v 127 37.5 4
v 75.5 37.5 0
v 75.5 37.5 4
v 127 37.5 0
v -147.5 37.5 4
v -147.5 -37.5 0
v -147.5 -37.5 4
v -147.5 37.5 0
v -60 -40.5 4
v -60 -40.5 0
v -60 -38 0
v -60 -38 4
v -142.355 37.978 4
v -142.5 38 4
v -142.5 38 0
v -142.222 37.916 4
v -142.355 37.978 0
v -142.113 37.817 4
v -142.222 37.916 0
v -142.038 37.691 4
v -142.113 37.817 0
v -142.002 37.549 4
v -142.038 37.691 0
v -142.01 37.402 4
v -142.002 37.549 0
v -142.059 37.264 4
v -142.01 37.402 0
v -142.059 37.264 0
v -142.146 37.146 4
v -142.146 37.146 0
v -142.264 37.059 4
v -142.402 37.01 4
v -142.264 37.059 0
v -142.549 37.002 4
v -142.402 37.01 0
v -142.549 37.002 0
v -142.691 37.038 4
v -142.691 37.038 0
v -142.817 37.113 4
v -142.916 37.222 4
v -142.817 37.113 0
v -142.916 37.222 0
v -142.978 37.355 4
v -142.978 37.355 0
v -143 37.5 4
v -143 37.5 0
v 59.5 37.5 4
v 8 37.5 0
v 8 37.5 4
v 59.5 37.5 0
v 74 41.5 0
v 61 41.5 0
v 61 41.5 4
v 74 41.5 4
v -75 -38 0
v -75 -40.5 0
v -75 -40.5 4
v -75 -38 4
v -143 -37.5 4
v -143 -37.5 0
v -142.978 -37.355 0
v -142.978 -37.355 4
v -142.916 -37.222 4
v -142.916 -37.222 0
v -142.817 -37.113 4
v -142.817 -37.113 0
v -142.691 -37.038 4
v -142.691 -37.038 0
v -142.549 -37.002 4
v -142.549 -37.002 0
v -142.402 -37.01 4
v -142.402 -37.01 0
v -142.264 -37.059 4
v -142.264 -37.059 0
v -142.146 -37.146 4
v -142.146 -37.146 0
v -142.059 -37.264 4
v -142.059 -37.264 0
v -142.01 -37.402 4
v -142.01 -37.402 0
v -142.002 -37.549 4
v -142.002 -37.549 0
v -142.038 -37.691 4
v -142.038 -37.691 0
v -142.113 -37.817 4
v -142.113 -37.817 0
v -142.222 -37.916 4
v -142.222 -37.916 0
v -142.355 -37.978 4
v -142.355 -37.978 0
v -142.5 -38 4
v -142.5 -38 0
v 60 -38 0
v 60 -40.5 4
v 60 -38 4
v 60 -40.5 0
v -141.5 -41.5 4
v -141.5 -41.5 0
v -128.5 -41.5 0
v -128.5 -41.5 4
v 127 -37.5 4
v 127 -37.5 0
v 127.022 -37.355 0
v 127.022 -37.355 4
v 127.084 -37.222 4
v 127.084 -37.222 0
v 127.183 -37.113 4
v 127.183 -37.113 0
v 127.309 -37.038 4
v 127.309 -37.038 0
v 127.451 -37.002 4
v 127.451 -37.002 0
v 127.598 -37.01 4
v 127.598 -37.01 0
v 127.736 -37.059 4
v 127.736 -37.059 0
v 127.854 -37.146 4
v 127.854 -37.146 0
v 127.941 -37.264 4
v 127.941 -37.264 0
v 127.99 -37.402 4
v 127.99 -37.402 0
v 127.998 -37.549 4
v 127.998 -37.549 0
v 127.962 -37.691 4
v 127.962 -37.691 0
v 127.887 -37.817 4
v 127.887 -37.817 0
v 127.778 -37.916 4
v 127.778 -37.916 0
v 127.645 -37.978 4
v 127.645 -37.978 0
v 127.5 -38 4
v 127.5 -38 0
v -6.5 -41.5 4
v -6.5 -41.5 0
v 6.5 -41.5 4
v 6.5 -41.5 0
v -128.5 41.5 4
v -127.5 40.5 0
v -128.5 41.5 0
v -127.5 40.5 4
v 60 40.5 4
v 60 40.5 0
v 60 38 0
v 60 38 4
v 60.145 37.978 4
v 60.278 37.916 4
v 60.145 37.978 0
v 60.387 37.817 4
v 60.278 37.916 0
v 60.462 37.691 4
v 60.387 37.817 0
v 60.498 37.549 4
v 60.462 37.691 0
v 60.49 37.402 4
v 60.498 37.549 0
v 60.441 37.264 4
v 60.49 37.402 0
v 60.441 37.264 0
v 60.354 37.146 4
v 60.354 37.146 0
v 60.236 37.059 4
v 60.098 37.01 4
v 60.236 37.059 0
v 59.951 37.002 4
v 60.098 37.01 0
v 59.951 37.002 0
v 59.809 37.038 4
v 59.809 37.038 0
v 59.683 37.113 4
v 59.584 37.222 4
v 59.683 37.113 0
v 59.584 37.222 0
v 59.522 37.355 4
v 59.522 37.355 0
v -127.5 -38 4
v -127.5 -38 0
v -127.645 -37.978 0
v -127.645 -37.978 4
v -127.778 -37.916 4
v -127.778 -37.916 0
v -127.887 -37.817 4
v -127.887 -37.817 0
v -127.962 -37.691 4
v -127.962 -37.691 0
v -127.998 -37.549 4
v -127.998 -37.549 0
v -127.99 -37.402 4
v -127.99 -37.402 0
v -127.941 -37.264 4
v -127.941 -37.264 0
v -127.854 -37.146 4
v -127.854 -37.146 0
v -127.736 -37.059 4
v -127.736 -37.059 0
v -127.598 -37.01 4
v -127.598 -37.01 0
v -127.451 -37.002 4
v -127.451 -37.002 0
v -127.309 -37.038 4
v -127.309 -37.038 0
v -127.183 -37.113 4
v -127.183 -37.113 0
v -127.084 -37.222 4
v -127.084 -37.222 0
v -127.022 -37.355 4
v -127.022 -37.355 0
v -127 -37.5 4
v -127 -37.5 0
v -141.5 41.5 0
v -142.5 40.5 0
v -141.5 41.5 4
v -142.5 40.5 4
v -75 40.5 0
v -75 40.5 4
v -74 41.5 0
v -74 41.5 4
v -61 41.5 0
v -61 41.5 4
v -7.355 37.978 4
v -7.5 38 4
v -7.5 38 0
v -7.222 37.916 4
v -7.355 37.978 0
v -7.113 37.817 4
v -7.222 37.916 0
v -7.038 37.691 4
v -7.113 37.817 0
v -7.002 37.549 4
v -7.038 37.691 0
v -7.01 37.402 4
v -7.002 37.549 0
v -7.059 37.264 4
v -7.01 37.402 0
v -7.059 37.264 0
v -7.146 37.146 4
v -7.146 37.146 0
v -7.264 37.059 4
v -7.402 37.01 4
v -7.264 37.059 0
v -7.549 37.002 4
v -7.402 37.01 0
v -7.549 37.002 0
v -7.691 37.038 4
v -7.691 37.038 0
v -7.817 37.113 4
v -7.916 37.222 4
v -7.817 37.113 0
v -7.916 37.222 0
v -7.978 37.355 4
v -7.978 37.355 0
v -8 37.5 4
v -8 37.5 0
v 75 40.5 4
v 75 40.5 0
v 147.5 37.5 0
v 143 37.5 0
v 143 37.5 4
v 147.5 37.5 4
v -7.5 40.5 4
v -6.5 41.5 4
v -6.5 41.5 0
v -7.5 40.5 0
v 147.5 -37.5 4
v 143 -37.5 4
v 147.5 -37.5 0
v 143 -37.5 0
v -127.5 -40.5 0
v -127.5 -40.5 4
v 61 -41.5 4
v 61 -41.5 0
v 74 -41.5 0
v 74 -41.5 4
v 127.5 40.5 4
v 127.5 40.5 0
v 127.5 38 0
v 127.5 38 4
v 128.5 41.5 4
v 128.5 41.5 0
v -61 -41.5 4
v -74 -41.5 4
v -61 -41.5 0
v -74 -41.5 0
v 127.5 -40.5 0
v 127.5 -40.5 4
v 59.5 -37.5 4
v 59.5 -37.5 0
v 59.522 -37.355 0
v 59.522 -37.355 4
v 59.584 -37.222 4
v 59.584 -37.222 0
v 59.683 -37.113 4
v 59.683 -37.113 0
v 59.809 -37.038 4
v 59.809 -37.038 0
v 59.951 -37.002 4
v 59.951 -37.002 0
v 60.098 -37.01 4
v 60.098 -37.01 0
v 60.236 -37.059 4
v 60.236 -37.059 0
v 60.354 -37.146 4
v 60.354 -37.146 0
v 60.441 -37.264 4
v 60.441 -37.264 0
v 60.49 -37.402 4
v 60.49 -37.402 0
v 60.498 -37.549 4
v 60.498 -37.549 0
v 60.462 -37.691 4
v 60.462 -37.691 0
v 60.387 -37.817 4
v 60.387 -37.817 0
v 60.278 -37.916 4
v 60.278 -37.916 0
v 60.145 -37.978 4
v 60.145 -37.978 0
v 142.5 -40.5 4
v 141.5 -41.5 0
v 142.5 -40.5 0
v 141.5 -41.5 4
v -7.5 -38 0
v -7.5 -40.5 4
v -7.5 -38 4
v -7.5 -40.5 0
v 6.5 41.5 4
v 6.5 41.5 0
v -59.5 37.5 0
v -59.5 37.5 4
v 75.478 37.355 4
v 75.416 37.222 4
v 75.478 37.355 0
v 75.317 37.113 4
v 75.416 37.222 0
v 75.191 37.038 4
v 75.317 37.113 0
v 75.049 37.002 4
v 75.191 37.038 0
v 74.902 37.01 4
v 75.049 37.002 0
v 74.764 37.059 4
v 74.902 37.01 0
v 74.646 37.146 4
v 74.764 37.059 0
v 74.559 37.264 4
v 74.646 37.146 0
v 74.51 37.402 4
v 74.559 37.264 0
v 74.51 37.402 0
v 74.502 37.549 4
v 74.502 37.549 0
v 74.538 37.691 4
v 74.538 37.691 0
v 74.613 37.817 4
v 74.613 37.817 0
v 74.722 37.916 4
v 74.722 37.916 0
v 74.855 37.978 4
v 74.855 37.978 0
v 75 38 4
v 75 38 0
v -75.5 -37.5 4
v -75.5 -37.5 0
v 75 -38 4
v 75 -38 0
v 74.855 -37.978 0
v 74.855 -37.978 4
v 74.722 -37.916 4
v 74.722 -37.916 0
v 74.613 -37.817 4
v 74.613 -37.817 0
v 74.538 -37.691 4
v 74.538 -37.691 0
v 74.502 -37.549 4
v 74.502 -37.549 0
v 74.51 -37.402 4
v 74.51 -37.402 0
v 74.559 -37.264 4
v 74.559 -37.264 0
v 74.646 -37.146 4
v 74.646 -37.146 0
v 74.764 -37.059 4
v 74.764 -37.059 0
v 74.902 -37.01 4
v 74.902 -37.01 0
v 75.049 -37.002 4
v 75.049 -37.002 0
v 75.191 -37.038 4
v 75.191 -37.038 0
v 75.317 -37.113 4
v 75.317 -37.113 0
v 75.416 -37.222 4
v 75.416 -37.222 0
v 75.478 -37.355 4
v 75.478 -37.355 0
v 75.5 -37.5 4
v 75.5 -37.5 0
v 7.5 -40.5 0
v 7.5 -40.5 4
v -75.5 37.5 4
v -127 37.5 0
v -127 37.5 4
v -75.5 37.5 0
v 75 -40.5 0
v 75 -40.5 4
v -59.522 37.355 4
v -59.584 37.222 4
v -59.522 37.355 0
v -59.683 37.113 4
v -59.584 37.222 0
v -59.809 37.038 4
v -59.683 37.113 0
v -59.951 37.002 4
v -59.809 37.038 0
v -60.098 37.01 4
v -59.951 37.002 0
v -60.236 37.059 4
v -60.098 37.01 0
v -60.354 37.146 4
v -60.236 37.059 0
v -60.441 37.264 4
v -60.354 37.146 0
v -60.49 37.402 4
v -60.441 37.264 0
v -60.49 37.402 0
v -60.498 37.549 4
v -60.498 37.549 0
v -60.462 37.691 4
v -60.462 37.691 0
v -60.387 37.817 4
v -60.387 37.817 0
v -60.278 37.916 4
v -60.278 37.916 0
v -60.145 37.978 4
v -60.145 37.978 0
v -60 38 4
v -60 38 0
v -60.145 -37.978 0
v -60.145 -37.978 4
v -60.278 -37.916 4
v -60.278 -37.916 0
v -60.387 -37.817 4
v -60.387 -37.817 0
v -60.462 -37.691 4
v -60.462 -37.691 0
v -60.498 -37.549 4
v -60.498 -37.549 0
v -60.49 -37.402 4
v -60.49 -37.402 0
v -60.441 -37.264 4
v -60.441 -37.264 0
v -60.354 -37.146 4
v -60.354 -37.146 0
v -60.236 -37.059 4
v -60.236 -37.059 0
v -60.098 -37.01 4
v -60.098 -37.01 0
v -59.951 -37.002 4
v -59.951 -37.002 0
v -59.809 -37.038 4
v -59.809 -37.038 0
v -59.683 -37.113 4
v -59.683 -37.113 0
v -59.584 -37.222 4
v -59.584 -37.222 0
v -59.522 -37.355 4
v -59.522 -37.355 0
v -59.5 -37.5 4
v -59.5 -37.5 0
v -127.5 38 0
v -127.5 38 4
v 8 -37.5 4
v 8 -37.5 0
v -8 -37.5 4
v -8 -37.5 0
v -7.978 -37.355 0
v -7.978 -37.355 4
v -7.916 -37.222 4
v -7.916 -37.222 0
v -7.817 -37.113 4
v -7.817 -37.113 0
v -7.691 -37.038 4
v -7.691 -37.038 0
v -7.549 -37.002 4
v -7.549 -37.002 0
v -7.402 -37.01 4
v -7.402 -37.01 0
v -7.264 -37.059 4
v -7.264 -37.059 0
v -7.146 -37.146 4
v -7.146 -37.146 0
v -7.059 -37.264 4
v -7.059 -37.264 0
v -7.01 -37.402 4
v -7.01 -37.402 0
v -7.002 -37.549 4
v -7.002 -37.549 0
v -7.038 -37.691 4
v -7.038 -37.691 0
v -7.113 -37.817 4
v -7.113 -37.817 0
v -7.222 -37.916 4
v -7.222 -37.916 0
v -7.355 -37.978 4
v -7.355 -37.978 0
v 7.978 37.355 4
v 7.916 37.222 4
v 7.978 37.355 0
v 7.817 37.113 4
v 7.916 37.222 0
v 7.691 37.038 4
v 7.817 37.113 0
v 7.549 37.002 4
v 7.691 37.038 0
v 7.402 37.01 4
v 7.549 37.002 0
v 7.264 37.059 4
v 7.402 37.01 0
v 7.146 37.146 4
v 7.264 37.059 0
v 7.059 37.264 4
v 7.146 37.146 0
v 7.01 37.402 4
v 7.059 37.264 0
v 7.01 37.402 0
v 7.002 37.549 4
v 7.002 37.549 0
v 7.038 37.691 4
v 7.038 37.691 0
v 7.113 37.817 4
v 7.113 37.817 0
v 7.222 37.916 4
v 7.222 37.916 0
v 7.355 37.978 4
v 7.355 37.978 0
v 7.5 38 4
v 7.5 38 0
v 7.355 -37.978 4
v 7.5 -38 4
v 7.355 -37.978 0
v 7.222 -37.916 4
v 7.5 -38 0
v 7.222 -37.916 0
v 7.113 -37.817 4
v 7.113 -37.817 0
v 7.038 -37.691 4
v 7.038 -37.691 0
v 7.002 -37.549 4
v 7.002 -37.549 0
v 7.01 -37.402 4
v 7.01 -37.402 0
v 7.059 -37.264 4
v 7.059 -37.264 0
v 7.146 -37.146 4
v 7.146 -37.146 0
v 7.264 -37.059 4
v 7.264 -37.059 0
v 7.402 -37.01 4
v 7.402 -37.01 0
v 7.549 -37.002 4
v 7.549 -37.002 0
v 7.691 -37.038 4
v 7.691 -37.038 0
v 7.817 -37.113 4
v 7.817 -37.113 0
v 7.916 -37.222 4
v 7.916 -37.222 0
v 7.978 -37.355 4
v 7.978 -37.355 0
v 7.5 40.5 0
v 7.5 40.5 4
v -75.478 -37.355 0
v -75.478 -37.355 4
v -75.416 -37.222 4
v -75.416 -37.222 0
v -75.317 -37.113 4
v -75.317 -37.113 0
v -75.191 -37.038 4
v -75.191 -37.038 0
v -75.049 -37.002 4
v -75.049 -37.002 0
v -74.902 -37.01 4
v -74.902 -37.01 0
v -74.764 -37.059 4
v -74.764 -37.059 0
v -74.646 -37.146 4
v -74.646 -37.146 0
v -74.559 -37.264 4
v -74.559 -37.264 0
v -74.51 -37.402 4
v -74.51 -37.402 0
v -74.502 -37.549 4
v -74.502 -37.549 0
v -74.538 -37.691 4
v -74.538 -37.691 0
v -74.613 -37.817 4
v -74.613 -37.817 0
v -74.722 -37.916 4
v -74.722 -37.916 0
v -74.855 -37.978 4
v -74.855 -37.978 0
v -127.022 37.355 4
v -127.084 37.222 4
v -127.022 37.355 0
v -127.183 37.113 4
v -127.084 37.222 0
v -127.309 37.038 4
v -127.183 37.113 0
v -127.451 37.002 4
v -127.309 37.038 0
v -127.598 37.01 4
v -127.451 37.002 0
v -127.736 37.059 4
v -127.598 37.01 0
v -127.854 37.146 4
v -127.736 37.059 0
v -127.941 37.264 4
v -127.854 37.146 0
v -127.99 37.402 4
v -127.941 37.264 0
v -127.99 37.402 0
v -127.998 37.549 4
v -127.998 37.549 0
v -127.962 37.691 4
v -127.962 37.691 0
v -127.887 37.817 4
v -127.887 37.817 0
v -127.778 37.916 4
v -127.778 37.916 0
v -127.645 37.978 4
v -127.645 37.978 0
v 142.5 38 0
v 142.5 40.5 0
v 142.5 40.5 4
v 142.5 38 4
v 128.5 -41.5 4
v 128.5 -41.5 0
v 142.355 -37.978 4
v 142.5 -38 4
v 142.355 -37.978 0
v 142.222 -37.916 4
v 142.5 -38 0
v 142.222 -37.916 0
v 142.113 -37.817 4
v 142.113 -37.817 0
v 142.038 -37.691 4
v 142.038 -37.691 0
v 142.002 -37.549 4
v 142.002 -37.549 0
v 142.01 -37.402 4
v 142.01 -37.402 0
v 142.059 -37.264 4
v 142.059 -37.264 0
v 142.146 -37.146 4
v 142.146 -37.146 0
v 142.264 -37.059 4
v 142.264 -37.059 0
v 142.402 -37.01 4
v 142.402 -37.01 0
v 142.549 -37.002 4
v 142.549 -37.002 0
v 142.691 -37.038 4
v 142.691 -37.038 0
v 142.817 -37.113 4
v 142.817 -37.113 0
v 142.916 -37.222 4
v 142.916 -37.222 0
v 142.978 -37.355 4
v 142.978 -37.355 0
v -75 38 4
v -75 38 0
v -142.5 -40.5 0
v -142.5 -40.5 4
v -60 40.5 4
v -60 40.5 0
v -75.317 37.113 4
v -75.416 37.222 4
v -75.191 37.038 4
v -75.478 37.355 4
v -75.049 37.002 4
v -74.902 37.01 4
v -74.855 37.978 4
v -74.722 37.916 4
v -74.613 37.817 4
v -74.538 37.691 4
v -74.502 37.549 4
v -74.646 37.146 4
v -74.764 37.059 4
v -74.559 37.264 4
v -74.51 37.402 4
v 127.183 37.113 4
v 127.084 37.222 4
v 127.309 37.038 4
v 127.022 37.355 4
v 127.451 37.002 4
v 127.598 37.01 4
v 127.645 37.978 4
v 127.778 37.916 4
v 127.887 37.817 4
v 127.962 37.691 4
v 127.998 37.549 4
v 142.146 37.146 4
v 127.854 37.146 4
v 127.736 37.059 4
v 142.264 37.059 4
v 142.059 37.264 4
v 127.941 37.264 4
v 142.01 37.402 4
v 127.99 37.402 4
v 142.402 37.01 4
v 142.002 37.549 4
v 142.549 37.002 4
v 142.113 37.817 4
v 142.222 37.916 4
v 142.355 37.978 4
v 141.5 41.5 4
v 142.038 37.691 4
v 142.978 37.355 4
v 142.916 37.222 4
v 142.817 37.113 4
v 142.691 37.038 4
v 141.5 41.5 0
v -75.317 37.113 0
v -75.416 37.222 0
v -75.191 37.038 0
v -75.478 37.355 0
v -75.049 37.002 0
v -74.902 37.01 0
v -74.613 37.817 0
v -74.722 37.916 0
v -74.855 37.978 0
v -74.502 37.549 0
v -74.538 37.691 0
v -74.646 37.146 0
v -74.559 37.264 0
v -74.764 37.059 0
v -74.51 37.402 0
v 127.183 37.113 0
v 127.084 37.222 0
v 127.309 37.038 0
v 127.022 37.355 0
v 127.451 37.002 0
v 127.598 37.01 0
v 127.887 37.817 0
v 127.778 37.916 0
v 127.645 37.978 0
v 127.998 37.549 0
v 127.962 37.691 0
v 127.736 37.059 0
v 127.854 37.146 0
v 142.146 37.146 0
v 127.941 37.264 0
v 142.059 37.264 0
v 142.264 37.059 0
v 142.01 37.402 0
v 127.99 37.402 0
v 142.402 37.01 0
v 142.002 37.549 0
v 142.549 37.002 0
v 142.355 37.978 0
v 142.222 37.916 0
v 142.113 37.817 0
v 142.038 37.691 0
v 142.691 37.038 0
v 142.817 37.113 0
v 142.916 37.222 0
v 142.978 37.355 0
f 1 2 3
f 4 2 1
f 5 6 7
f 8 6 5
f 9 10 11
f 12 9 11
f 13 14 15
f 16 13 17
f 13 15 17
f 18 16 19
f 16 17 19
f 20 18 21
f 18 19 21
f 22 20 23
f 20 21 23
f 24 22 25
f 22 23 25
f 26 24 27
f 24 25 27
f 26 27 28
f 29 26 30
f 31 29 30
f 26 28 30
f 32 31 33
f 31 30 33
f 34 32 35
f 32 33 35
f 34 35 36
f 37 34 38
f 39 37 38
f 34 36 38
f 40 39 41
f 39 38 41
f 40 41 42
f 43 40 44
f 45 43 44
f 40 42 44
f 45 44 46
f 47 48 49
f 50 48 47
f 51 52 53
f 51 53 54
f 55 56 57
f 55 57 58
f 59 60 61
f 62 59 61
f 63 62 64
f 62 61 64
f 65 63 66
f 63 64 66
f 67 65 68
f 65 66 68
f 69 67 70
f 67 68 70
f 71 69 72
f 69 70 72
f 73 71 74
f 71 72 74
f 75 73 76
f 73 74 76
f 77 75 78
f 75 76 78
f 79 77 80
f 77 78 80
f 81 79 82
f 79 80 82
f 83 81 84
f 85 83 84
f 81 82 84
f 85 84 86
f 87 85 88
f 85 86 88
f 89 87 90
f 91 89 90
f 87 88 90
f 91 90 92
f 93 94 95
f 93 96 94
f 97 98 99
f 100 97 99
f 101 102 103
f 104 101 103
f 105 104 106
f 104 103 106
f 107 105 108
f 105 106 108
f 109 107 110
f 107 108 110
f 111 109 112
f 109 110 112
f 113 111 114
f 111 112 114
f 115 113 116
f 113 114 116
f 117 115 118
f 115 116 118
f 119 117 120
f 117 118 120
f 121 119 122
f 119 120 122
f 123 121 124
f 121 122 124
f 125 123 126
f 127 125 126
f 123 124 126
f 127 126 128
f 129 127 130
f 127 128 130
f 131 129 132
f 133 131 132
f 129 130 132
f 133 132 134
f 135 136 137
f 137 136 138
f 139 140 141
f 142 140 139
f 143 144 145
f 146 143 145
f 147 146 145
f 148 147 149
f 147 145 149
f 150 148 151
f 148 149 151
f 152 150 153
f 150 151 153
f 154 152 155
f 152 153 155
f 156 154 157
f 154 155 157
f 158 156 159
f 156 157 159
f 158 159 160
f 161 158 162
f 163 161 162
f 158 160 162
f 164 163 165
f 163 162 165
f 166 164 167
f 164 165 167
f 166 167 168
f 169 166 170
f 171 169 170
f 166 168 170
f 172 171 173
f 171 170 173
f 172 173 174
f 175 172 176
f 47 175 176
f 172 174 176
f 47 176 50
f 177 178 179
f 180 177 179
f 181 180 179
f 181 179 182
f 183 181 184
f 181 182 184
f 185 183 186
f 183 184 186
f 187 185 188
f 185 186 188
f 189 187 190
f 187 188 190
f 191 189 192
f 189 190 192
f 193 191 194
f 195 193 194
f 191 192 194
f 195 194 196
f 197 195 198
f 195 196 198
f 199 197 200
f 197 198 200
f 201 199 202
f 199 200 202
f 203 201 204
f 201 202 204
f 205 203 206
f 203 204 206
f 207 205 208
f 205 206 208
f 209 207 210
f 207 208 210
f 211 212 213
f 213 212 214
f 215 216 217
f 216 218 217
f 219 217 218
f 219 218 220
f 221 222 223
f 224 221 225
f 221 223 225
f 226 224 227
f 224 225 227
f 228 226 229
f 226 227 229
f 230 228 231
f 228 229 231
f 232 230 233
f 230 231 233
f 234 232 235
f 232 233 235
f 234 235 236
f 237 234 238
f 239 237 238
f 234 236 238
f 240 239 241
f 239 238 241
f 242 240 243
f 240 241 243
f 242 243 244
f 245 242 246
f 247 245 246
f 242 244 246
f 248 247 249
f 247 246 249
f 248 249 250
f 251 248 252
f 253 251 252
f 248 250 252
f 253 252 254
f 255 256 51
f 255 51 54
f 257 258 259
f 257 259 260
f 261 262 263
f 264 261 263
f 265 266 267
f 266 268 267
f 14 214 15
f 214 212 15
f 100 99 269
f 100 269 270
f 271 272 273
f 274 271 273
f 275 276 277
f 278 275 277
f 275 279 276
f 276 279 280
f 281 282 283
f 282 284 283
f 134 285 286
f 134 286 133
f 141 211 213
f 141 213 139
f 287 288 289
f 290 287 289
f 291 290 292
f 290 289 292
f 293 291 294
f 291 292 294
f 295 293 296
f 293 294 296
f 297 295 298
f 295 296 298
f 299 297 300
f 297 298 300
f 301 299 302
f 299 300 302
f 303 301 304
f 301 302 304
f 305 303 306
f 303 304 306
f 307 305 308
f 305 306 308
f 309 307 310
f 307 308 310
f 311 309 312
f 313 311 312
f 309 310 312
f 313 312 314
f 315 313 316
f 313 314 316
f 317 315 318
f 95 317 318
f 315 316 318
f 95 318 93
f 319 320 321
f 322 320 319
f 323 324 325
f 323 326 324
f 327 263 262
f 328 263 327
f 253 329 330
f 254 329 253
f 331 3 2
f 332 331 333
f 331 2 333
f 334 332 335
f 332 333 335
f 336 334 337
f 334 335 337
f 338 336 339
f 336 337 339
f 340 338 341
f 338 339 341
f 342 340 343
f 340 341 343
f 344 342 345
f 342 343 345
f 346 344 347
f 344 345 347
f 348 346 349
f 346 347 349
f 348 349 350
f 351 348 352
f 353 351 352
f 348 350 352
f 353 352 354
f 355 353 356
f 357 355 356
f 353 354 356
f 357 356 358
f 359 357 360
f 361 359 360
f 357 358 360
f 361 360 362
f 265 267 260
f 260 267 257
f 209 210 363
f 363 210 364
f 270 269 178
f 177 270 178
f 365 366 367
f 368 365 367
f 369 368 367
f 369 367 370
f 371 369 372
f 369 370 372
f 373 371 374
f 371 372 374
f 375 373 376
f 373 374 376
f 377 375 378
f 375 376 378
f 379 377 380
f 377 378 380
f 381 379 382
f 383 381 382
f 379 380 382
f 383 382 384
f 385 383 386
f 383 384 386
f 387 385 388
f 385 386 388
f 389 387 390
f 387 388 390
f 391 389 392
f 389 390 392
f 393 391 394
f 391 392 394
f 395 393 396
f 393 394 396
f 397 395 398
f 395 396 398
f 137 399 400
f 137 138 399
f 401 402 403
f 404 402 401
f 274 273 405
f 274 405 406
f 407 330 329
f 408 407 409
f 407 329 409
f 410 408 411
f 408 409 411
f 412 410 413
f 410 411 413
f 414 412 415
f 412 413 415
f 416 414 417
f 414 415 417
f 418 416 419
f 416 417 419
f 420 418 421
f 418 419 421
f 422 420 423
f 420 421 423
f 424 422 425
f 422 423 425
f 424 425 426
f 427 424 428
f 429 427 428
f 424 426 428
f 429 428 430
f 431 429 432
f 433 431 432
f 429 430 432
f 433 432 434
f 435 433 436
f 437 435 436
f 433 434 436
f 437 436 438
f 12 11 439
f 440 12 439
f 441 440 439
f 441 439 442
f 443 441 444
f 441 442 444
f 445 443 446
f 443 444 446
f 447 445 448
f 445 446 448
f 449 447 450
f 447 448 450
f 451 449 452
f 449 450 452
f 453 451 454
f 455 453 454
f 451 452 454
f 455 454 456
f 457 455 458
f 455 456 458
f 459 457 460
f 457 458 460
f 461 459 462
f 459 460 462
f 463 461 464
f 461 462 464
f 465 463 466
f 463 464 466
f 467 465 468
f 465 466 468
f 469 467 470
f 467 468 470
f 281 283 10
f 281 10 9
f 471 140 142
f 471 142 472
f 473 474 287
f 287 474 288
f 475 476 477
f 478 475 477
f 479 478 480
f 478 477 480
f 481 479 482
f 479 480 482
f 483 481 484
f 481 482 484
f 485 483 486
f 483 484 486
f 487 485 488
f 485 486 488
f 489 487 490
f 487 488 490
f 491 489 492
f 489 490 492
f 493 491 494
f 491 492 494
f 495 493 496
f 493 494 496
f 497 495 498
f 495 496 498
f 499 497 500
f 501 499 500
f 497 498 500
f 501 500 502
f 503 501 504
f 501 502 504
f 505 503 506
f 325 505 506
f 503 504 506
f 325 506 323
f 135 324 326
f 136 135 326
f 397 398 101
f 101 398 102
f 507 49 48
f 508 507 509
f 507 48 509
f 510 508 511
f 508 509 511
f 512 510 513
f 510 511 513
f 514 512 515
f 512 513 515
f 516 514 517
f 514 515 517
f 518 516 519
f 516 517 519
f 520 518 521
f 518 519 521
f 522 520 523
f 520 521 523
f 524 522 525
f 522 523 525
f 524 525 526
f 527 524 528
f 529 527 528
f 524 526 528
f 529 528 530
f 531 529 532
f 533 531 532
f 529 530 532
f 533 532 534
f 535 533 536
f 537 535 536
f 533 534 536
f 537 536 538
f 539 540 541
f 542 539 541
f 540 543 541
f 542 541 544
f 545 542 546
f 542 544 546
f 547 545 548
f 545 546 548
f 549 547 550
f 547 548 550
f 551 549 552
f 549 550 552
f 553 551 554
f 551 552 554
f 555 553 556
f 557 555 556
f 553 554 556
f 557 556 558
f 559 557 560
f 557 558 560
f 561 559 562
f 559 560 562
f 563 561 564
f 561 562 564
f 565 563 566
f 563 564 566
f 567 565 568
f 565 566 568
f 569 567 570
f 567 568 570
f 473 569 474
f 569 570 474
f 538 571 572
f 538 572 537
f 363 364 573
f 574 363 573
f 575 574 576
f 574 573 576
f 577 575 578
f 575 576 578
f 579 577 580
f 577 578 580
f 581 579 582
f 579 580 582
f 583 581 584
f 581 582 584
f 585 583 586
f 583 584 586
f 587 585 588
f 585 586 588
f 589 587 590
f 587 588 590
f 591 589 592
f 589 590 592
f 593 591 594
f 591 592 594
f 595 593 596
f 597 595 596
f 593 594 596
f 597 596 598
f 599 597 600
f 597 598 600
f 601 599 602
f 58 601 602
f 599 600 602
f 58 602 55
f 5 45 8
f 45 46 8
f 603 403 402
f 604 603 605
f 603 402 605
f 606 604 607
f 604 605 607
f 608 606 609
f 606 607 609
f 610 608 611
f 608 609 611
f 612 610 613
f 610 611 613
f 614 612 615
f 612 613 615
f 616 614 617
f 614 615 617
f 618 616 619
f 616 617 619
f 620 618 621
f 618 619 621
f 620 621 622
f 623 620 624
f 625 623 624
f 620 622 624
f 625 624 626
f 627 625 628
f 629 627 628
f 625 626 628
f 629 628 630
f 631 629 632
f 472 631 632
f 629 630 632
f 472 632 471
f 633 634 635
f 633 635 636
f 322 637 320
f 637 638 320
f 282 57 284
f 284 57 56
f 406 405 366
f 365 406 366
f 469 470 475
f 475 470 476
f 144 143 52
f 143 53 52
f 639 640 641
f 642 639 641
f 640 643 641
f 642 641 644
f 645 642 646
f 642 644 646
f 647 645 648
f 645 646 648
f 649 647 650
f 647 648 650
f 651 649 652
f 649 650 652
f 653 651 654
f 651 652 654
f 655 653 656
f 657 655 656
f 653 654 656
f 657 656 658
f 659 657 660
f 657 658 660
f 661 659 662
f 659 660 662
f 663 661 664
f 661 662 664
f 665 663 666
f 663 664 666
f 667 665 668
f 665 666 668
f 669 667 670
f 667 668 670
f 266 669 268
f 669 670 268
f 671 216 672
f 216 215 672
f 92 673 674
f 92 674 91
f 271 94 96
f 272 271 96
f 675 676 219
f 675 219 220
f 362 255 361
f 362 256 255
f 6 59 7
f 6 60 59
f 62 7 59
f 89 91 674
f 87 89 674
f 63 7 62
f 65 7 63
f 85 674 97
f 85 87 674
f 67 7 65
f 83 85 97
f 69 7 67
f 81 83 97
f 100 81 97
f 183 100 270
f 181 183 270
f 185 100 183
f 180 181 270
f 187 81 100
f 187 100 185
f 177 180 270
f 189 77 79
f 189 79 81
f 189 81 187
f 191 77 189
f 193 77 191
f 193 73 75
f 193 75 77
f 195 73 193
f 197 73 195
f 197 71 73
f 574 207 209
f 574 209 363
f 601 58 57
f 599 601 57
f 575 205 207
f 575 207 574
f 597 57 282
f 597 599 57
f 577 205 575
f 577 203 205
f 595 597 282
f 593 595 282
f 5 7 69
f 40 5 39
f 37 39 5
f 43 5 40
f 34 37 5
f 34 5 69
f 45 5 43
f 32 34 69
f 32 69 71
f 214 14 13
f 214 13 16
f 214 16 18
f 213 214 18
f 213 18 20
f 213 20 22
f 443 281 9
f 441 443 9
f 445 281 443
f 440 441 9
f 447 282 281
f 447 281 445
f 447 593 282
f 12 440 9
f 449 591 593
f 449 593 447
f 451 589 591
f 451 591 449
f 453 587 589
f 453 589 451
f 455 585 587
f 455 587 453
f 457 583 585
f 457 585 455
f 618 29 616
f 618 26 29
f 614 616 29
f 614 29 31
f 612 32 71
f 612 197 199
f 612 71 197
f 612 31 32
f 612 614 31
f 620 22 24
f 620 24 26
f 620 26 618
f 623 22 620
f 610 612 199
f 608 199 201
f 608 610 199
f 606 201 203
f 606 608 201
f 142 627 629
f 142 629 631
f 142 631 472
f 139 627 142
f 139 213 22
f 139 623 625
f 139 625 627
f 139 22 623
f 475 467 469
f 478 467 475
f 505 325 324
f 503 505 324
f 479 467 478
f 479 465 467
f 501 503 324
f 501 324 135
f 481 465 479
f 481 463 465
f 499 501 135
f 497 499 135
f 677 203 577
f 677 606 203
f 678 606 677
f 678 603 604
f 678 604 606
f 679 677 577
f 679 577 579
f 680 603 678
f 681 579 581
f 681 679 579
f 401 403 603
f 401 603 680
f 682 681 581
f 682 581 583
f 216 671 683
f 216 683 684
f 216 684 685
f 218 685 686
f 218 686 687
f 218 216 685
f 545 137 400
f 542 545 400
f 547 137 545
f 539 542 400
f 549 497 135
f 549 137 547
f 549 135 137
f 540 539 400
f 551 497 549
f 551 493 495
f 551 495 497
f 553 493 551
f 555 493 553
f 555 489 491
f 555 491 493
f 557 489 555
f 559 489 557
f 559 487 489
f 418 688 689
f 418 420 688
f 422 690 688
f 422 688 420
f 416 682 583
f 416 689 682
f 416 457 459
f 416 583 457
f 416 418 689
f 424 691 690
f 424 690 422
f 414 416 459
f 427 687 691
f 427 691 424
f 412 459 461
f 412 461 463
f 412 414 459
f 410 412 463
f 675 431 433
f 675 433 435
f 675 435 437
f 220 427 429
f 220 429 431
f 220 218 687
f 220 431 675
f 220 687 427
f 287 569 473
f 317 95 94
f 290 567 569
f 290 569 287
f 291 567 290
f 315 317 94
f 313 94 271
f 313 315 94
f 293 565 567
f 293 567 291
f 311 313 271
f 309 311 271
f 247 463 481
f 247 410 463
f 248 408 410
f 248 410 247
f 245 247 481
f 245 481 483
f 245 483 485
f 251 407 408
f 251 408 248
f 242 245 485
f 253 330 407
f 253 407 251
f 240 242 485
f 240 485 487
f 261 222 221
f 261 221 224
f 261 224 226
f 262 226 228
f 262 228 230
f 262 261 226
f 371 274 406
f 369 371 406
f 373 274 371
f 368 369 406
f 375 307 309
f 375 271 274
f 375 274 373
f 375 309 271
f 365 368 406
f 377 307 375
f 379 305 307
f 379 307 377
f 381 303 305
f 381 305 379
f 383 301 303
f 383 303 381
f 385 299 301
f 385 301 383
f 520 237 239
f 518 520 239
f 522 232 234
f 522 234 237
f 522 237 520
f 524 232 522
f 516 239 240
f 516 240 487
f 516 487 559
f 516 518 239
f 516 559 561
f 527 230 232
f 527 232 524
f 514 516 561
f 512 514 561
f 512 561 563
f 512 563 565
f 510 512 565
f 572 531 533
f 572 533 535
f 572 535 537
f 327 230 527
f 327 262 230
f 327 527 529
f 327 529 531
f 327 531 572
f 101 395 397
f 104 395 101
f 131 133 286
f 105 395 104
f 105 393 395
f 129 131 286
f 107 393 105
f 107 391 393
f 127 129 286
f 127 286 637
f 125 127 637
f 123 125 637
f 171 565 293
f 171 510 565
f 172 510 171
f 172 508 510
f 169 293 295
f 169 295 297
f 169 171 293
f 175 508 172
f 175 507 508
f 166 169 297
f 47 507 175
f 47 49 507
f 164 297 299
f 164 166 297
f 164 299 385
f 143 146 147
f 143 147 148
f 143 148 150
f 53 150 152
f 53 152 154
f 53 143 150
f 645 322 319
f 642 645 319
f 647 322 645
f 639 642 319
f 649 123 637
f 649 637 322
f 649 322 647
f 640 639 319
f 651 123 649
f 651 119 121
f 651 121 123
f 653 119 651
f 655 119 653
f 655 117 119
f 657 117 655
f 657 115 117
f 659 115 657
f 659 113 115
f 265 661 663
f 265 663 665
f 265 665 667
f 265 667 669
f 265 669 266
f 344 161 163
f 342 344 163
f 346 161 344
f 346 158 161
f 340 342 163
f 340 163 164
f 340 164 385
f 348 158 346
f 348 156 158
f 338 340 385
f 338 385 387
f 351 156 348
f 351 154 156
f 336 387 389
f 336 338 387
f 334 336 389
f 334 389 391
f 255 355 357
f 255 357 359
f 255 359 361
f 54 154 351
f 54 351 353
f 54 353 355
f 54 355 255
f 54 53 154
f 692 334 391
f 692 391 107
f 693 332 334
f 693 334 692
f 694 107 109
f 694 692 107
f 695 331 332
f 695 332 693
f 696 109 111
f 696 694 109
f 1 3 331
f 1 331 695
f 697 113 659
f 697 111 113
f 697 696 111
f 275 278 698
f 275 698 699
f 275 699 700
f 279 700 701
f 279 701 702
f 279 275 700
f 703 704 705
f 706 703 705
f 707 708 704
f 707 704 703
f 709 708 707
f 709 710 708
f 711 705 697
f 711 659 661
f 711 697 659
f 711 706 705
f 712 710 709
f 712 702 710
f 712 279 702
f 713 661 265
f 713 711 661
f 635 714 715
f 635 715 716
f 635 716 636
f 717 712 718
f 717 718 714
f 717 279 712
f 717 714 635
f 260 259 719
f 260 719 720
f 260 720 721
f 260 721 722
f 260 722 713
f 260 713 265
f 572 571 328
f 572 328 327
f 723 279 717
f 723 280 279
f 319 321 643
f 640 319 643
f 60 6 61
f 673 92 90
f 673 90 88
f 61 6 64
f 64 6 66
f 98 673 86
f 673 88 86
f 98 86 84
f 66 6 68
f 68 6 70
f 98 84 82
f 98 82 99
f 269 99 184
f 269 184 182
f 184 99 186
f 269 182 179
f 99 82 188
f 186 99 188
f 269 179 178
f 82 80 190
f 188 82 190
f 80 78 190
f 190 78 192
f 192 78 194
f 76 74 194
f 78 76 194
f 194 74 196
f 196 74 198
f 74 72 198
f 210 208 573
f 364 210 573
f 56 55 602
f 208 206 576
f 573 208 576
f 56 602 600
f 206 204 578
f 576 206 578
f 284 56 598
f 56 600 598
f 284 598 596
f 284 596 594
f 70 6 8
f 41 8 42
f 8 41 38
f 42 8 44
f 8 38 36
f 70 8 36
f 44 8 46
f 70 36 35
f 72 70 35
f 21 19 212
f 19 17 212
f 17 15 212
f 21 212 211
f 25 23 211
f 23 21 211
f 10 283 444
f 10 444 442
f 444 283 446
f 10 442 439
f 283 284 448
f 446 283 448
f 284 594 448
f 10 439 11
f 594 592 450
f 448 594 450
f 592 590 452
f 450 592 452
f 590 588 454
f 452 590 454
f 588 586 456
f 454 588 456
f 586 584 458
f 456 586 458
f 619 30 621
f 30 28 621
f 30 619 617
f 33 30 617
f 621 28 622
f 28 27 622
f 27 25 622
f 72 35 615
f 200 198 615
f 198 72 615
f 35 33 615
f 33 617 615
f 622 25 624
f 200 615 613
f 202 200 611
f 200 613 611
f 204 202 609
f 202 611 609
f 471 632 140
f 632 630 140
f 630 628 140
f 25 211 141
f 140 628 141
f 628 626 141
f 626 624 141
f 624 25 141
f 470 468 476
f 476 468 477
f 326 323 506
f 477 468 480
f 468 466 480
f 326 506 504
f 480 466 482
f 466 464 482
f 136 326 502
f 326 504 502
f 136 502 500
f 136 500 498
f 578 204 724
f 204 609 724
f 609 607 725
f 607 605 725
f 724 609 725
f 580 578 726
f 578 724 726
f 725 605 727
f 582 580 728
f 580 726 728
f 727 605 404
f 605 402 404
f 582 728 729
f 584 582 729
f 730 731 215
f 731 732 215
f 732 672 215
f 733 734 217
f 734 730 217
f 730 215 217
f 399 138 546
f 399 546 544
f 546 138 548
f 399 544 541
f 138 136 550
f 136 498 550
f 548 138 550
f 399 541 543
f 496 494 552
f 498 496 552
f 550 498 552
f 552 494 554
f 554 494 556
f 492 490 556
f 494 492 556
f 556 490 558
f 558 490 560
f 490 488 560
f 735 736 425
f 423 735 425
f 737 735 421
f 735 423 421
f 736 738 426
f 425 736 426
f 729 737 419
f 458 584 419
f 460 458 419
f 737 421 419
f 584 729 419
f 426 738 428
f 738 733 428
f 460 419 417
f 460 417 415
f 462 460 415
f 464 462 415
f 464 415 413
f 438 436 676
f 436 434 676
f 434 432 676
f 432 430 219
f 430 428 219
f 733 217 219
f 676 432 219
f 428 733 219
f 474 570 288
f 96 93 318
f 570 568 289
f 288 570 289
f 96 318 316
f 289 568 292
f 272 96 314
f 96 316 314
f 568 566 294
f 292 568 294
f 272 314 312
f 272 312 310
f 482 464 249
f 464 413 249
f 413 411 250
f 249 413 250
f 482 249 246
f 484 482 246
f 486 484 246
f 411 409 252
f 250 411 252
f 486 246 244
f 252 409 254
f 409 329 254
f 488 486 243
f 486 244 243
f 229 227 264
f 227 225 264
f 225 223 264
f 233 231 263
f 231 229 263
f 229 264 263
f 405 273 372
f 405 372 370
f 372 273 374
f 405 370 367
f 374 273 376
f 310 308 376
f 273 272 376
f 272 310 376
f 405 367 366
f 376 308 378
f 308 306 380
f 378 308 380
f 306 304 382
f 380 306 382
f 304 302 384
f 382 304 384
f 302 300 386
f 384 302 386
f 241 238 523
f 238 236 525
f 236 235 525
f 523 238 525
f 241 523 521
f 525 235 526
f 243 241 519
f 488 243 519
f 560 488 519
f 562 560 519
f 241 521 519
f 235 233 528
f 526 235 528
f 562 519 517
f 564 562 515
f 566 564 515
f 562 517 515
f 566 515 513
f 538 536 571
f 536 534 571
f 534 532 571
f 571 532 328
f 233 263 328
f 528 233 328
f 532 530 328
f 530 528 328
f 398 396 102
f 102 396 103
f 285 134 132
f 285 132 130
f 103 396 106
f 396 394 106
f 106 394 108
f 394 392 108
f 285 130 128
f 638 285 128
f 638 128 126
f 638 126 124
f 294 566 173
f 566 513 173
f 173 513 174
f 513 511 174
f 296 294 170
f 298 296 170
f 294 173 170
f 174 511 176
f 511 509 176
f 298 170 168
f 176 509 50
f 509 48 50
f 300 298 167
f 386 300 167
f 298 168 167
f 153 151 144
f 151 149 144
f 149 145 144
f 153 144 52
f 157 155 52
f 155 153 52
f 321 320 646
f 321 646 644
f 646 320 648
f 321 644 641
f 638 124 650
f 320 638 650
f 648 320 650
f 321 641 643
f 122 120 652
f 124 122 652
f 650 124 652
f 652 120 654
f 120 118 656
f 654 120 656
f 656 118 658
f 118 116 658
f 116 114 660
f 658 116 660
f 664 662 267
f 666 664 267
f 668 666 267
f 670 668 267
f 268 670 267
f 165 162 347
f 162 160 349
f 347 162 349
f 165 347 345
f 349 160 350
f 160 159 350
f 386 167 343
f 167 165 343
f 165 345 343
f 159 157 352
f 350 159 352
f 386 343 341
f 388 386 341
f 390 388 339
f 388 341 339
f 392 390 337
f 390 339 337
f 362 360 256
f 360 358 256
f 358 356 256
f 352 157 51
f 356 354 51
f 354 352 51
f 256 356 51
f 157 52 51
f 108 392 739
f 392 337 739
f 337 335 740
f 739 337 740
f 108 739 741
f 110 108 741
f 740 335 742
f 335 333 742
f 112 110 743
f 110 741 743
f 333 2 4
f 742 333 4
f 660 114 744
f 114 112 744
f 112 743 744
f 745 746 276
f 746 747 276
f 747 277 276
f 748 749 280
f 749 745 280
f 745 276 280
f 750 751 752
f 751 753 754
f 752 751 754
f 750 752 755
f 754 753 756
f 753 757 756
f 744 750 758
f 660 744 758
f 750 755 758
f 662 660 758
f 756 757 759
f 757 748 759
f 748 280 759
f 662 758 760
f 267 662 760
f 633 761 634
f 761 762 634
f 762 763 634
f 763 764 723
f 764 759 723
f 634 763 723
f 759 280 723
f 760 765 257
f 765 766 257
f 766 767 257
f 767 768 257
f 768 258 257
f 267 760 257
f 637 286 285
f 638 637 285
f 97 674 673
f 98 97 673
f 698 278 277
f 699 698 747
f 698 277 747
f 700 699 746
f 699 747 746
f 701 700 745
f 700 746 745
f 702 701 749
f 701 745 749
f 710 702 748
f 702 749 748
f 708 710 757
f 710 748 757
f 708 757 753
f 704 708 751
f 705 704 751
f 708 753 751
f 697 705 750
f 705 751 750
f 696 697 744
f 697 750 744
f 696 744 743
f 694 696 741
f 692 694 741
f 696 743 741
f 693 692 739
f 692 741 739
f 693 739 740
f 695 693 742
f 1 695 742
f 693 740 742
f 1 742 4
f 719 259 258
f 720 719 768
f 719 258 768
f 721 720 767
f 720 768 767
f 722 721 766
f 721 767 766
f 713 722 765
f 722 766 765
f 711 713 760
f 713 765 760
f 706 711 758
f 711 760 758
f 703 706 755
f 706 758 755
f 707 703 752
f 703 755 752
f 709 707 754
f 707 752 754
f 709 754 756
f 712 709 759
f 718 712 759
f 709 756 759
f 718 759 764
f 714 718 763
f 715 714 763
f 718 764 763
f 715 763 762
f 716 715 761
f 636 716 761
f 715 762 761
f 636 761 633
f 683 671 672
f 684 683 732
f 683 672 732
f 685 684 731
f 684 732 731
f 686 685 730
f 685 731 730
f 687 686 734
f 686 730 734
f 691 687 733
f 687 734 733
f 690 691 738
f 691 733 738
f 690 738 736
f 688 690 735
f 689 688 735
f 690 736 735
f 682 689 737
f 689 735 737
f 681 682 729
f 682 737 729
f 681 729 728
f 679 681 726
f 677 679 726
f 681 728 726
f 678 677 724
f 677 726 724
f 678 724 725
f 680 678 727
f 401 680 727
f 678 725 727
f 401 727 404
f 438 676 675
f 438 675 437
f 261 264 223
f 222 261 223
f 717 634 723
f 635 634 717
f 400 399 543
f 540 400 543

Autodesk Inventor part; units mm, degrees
ref_plane "Plan YZ" through (0, 0, 0) normal (1, 0, 0) x (0, 1, 0)
ref_plane "Plan XZ" through (0, 0, 0) normal (0, 1, 0) x (-1, 0, 0)
ref_plane "Plan XY" through (0, 0, 0) normal (0, 0, 1) x (1, 0, 0)
sketch "Esquisse1" plane through (0, 0, 0) normal (0, 0, 1) x (1, 0, 0)
  line L0 (-142.5, 41.5) -> (-142.5, 37.5)
  line L1 (-142.5, 41.5) -> (-127.5, 41.5)
  line L2 (-127.5, 41.5) -> (-127.5, 37.5)
  line L3 (0, -58.1) -> (0, 58.1) construction
  line L4 (-206.5, 0) -> (206.5, 0) construction
  line L5 (-75, 41.5) -> (-75, 37.5)
  line L6 (-75, 41.5) -> (-60, 41.5)
  line L7 (-60, 41.5) -> (-60, 37.5)
  line L8 (-7.5, 41.5) -> (-7.5, 37.5)
  line L9 (-7.5, 41.5) -> (7.5, 41.5)
  line L10 (7.5, 41.5) -> (7.5, 37.5)
  line L11 (60, 41.5) -> (60, 37.5)
  line L12 (60, 41.5) -> (75, 41.5)
  line L13 (75, 41.5) -> (75, 37.5)
  line L14 (127.5, 41.5) -> (127.5, 37.5)
  line L15 (127.5, 41.5) -> (142.5, 41.5)
  line L16 (142.5, 41.5) -> (142.5, 37.5)
  line L17 (-127.5, 37.5) -> (-75, 37.5)
  line L18 (-60, 37.5) -> (-7.5, 37.5)
  line L19 (7.5, 37.5) -> (60, 37.5)
  line L20 (75, 37.5) -> (127.5, 37.5)
  line L21 (142.5, 37.5) -> (147.5, 37.5)
  line L22 (-142.5, 37.5) -> (-147.5, 37.5)
  line L23 (-142.5, -41.5) -> (-142.5, -37.5)
  line L24 (-142.5, -41.5) -> (-127.5, -41.5)
  line L25 (-127.5, -41.5) -> (-127.5, -37.5)
  line L26 (-75, -41.5) -> (-75, -37.5)
  line L27 (-75, -41.5) -> (-60, -41.5)
  line L28 (-60, -41.5) -> (-60, -37.5)
  line L29 (-7.5, -41.5) -> (-7.5, -37.5)
  line L30 (-7.5, -41.5) -> (7.5, -41.5)
  line L31 (7.5, -41.5) -> (7.5, -37.5)
  line L32 (60, -41.5) -> (60, -37.5)
  line L33 (60, -41.5) -> (75, -41.5)
  line L34 (75, -41.5) -> (75, -37.5)
  line L35 (127.5, -41.5) -> (127.5, -37.5)
  line L36 (127.5, -41.5) -> (142.5, -41.5)
  line L37 (142.5, -41.5) -> (142.5, -37.5)
  line L38 (-127.5, -37.5) -> (-75, -37.5)
  line L39 (-60, -37.5) -> (-7.5, -37.5)
  line L40 (7.5, -37.5) -> (60, -37.5)
  line L41 (75, -37.5) -> (127.5, -37.5)
  line L42 (142.5, -37.5) -> (147.5, -37.5)
  line L43 (-142.5, -37.5) -> (-147.5, -37.5)
  line L44 (147.5, -37.5) -> (147.5, 37.5)
  line L45 (-147.5, -37.5) -> (-147.5, 37.5)
  point P0 (0, 0)
  dimension "d1" = 15
  dimension "d3" = 4
  dimension "d6" = 67.5
  dimension "d11" = 5
  dimension "d12" = 5
  dimension "d30" = 75
extrude "Extrusion1" add sketch "Esquisse1" along normal blind 4
sketch "Esquisse6" plane through (0, 0, 4) normal (0, 0, 1) x (1, 0, 0)
  line L0 (0, -58.1) -> (0, 58.1) construction
  line L1 (-206.5, 0) -> (206.5, 0) construction
  point P0 (0, 0)
  point P1 (-142.5, 37.5)
  point P2 (-127.5, 37.5)
  point P3 (-75, 37.5)
  point P4 (-60, 37.5)
  point P5 (-7.5, 37.5)
  point P6 (7.5, 37.5)
  point P7 (60, 37.5)
  point P8 (75, 37.5)
  point P9 (142.5, 37.5)
  point P10 (127.5, 37.5)
  point P11 (-142.5, -37.5)
  point P12 (-127.5, -37.5)
  point P13 (-75, -37.5)
  point P14 (-60, -37.5)
  point P15 (-7.5, -37.5)
  point P16 (7.5, -37.5)
  point P17 (60, -37.5)
  point P18 (75, -37.5)
  point P19 (142.5, -37.5)
  point P20 (127.5, -37.5)
hole "Perçage1" at (-142.5, 37.5, 4) at (-127.5, 37.5, 4) at (-75, 37.5, 4) at (-60, 37.5, 4) at (-7.5, 37.5, 4) at (7.5, 37.5, 4) at (60, 37.5, 4) at (75, 37.5, 4) at (142.5, 37.5, 4) at (127.5, 37.5, 4) at (127.5, -37.5, 4) at (142.5, -37.5, 4) at (75, -37.5, 4) at (60, -37.5, 4) at (7.5, -37.5, 4) at (-7.5, -37.5, 4) at (-60, -37.5, 4) at (-75, -37.5, 4) at (-127.5, -37.5, 4) at (-142.5, -37.5, 4) direction (0, 0, -1) diameter 1 end through all
chamfer "Chanfrein1" distance 1 angle 45 20 edges at (-142.5, 41.5, 2) (-127.5, 41.5, 2) (-75, 41.5, 2) (-60, 41.5, 2) (-7.5, 41.5, 2) (7.5, 41.5, 2) (60, 41.5, 2) (75, 41.5, 2) (127.5, 41.5, 2) (142.5, 41.5, 2) (142.5, -41.5, 2) (127.5, -41.5, 2) (60, -41.5, 2) (75, -41.5, 2) (-142.5, -41.5, 2) (-127.5, -41.5, 2) (-75, -41.5, 2) (-60, -41.5, 2) (-7.5, -41.5, 2) (7.5, -41.5, 2)
properties part number "P1704_003" material "Plastique PMMA"
